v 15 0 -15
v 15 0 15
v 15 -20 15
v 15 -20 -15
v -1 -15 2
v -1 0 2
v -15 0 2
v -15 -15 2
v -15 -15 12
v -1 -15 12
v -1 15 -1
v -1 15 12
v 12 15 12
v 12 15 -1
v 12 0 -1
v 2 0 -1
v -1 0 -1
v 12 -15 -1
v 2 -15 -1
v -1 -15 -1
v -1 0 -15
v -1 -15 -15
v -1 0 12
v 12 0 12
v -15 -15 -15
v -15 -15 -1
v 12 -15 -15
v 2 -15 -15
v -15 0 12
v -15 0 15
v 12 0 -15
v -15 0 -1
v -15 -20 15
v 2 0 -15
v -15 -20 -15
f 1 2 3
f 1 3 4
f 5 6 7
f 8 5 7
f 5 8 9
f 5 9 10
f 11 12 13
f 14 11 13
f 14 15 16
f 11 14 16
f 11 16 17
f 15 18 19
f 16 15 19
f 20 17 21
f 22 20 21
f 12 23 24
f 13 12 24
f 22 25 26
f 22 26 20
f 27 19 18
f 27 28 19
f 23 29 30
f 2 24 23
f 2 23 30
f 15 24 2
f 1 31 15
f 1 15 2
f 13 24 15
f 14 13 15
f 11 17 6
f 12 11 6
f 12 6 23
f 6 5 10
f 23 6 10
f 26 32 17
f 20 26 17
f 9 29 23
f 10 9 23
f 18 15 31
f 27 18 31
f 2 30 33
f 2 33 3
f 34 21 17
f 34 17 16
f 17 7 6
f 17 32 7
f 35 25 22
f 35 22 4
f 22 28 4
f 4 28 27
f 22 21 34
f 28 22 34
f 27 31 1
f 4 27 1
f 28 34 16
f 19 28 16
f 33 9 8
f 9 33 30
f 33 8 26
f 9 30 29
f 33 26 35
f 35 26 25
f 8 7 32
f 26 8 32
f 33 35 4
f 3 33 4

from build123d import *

# Parameters (mm, degrees)
SKETCH1_W           = 30
SKETCH1_H           = 30
BOSS_EXTRUDE1_DEPTH = 20
SKETCH1_6_W         = 10
SKETCH1_6_H         = 14
SKETCH1_6_W_2       = 14
SKETCH1_6_H_2       = 10
CUT_EXTRUDE1_DEPTH  = 15
SKETCH1_7_W         = 13
SKETCH1_7_H         = 13
BOSS_EXTRUDE2_DEPTH = 15


with BuildPart() as part:
    # Sketch1 → Boss-Extrude1 (new body)
    with BuildSketch(Plane(origin=(0, 0, 0), x_dir=(1, 0, 0), z_dir=(0, 1, 0))):
        Rectangle(SKETCH1_W, SKETCH1_H)
    extrude(amount=-BOSS_EXTRUDE1_DEPTH)

    # Sketch1<6> → Cut-Extrude1 (cut)
    with BuildSketch(Plane(origin=(0, 0, 0), x_dir=(1, 0, 0), z_dir=(0, 1, 0))):
        with Locations((7, 8)):
            Rectangle(SKETCH1_6_W, SKETCH1_6_H)
        with Locations((-8, -7)):
            Rectangle(SKETCH1_6_W_2, SKETCH1_6_H_2)
        with Locations((-8, 8)):
            Rectangle(SKETCH1_6_W_2, SKETCH1_6_H)
    extrude(amount=-CUT_EXTRUDE1_DEPTH, mode=Mode.SUBTRACT)

    # Sketch1<7> → Boss-Extrude2 (add)
    with BuildSketch(Plane(origin=(0, 0, 0), x_dir=(1, 0, 0), z_dir=(0, 1, 0))):
        with Locations((5.5, -5.5)):
            Rectangle(SKETCH1_7_W, SKETCH1_7_H)
    extrude(amount=BOSS_EXTRUDE2_DEPTH)


solid = part.part
